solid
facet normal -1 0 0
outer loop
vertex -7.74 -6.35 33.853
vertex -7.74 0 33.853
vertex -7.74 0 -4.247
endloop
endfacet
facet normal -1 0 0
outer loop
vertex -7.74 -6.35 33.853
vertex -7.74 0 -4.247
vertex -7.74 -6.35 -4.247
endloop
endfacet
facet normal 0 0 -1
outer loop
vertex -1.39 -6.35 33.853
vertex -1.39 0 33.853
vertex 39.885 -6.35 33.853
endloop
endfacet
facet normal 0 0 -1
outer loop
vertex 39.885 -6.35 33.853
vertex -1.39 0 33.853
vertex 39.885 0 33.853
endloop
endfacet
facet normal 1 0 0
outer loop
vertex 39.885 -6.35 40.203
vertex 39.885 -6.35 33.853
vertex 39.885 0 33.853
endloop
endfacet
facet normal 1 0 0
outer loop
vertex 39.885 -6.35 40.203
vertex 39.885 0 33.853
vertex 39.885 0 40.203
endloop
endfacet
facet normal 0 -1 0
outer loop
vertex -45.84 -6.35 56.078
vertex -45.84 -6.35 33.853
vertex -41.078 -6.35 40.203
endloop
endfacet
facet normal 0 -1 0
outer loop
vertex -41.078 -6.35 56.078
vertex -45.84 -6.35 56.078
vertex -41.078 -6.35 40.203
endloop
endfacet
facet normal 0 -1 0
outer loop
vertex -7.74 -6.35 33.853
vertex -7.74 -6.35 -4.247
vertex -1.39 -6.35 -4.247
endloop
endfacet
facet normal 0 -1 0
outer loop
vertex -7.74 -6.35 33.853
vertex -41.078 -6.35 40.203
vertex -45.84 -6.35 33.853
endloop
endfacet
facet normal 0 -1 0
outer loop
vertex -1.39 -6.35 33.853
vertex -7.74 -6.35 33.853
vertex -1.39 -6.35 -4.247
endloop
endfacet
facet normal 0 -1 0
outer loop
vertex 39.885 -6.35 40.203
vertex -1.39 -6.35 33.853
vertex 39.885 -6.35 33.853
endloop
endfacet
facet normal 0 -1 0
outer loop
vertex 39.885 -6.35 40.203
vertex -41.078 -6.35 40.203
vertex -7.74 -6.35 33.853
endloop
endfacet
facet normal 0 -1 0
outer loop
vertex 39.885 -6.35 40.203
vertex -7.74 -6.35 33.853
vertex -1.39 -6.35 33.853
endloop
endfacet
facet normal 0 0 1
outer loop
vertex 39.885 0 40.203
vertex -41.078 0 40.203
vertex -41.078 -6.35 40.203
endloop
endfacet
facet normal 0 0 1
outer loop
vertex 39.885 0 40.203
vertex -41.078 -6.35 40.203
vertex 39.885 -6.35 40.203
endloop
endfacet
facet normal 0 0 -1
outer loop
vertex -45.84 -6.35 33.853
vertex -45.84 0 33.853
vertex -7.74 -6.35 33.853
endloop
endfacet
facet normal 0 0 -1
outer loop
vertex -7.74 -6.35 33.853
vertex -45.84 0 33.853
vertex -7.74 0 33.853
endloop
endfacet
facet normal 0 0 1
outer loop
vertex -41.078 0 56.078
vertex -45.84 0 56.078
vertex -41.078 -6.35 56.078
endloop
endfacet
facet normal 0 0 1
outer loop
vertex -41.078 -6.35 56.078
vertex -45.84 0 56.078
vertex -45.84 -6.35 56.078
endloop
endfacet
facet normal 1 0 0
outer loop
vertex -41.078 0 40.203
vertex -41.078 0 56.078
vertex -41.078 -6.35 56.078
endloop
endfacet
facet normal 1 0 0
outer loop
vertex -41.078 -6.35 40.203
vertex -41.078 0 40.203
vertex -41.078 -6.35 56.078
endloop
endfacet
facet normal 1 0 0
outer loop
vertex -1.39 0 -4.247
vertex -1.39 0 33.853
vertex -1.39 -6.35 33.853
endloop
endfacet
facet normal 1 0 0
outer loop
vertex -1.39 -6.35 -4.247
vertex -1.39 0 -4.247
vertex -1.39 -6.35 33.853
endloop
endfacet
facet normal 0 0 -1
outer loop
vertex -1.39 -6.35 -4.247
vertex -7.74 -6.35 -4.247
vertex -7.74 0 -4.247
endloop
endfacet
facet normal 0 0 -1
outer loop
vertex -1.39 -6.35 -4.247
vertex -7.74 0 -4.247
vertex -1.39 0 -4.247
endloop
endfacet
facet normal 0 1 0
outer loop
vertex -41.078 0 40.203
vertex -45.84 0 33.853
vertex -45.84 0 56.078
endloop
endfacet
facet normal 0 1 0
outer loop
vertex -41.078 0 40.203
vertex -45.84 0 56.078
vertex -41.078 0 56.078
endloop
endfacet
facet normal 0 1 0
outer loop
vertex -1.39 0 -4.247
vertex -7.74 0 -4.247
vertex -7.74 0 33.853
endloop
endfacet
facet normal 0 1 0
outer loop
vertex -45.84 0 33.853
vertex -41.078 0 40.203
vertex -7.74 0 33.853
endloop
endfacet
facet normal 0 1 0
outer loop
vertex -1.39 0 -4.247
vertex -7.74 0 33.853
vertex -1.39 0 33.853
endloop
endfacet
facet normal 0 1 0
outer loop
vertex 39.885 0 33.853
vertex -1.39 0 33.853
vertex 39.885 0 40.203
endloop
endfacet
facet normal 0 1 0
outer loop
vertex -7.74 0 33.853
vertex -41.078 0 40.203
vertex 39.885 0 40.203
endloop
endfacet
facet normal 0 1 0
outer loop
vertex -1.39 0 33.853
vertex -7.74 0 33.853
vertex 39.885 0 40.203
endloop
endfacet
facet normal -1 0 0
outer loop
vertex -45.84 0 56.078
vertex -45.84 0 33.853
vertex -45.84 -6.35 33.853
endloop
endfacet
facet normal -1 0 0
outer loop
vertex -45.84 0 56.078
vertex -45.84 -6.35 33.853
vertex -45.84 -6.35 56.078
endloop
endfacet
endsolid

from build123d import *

# Parameters (mm, degrees)
F0_W     = 85.725
F0_H     = 6.35
F1_DEPTH = 6.35
F2_W     = 6.35
F2_H     = 22.225
F3_DEPTH = 4.7625
F4_W     = 6.35
F4_H     = 6.35
F5_DEPTH = 38.1


with BuildPart() as f1:
    # F0 (on Front) → F1 (new body)
    with BuildSketch(Plane.XZ):
        with Locations((-2.977964, 37.027801)):
            Rectangle(F0_W, F0_H)
    extrude(amount=F1_DEPTH)

    # F2 (on face) → F3 (join)
    with BuildSketch(Plane(origin=(-45.840464, 0, 0), x_dir=(0, -1, 0), z_dir=(-1, 0, 0))):
        with Locations((3.175, 44.965301)):
            Rectangle(F2_W, F2_H)
    extrude(amount=-F3_DEPTH)

    # F4 (on face) → F5 (join)
    with BuildSketch(Plane(origin=(0, 0, 33.852801), x_dir=(1, 0, 0), z_dir=(0, 0, -1))):
        with Locations((-4.565464, 3.175)):
            Rectangle(F4_W, F4_H)
    extrude(amount=F5_DEPTH)


solid = f1.part
